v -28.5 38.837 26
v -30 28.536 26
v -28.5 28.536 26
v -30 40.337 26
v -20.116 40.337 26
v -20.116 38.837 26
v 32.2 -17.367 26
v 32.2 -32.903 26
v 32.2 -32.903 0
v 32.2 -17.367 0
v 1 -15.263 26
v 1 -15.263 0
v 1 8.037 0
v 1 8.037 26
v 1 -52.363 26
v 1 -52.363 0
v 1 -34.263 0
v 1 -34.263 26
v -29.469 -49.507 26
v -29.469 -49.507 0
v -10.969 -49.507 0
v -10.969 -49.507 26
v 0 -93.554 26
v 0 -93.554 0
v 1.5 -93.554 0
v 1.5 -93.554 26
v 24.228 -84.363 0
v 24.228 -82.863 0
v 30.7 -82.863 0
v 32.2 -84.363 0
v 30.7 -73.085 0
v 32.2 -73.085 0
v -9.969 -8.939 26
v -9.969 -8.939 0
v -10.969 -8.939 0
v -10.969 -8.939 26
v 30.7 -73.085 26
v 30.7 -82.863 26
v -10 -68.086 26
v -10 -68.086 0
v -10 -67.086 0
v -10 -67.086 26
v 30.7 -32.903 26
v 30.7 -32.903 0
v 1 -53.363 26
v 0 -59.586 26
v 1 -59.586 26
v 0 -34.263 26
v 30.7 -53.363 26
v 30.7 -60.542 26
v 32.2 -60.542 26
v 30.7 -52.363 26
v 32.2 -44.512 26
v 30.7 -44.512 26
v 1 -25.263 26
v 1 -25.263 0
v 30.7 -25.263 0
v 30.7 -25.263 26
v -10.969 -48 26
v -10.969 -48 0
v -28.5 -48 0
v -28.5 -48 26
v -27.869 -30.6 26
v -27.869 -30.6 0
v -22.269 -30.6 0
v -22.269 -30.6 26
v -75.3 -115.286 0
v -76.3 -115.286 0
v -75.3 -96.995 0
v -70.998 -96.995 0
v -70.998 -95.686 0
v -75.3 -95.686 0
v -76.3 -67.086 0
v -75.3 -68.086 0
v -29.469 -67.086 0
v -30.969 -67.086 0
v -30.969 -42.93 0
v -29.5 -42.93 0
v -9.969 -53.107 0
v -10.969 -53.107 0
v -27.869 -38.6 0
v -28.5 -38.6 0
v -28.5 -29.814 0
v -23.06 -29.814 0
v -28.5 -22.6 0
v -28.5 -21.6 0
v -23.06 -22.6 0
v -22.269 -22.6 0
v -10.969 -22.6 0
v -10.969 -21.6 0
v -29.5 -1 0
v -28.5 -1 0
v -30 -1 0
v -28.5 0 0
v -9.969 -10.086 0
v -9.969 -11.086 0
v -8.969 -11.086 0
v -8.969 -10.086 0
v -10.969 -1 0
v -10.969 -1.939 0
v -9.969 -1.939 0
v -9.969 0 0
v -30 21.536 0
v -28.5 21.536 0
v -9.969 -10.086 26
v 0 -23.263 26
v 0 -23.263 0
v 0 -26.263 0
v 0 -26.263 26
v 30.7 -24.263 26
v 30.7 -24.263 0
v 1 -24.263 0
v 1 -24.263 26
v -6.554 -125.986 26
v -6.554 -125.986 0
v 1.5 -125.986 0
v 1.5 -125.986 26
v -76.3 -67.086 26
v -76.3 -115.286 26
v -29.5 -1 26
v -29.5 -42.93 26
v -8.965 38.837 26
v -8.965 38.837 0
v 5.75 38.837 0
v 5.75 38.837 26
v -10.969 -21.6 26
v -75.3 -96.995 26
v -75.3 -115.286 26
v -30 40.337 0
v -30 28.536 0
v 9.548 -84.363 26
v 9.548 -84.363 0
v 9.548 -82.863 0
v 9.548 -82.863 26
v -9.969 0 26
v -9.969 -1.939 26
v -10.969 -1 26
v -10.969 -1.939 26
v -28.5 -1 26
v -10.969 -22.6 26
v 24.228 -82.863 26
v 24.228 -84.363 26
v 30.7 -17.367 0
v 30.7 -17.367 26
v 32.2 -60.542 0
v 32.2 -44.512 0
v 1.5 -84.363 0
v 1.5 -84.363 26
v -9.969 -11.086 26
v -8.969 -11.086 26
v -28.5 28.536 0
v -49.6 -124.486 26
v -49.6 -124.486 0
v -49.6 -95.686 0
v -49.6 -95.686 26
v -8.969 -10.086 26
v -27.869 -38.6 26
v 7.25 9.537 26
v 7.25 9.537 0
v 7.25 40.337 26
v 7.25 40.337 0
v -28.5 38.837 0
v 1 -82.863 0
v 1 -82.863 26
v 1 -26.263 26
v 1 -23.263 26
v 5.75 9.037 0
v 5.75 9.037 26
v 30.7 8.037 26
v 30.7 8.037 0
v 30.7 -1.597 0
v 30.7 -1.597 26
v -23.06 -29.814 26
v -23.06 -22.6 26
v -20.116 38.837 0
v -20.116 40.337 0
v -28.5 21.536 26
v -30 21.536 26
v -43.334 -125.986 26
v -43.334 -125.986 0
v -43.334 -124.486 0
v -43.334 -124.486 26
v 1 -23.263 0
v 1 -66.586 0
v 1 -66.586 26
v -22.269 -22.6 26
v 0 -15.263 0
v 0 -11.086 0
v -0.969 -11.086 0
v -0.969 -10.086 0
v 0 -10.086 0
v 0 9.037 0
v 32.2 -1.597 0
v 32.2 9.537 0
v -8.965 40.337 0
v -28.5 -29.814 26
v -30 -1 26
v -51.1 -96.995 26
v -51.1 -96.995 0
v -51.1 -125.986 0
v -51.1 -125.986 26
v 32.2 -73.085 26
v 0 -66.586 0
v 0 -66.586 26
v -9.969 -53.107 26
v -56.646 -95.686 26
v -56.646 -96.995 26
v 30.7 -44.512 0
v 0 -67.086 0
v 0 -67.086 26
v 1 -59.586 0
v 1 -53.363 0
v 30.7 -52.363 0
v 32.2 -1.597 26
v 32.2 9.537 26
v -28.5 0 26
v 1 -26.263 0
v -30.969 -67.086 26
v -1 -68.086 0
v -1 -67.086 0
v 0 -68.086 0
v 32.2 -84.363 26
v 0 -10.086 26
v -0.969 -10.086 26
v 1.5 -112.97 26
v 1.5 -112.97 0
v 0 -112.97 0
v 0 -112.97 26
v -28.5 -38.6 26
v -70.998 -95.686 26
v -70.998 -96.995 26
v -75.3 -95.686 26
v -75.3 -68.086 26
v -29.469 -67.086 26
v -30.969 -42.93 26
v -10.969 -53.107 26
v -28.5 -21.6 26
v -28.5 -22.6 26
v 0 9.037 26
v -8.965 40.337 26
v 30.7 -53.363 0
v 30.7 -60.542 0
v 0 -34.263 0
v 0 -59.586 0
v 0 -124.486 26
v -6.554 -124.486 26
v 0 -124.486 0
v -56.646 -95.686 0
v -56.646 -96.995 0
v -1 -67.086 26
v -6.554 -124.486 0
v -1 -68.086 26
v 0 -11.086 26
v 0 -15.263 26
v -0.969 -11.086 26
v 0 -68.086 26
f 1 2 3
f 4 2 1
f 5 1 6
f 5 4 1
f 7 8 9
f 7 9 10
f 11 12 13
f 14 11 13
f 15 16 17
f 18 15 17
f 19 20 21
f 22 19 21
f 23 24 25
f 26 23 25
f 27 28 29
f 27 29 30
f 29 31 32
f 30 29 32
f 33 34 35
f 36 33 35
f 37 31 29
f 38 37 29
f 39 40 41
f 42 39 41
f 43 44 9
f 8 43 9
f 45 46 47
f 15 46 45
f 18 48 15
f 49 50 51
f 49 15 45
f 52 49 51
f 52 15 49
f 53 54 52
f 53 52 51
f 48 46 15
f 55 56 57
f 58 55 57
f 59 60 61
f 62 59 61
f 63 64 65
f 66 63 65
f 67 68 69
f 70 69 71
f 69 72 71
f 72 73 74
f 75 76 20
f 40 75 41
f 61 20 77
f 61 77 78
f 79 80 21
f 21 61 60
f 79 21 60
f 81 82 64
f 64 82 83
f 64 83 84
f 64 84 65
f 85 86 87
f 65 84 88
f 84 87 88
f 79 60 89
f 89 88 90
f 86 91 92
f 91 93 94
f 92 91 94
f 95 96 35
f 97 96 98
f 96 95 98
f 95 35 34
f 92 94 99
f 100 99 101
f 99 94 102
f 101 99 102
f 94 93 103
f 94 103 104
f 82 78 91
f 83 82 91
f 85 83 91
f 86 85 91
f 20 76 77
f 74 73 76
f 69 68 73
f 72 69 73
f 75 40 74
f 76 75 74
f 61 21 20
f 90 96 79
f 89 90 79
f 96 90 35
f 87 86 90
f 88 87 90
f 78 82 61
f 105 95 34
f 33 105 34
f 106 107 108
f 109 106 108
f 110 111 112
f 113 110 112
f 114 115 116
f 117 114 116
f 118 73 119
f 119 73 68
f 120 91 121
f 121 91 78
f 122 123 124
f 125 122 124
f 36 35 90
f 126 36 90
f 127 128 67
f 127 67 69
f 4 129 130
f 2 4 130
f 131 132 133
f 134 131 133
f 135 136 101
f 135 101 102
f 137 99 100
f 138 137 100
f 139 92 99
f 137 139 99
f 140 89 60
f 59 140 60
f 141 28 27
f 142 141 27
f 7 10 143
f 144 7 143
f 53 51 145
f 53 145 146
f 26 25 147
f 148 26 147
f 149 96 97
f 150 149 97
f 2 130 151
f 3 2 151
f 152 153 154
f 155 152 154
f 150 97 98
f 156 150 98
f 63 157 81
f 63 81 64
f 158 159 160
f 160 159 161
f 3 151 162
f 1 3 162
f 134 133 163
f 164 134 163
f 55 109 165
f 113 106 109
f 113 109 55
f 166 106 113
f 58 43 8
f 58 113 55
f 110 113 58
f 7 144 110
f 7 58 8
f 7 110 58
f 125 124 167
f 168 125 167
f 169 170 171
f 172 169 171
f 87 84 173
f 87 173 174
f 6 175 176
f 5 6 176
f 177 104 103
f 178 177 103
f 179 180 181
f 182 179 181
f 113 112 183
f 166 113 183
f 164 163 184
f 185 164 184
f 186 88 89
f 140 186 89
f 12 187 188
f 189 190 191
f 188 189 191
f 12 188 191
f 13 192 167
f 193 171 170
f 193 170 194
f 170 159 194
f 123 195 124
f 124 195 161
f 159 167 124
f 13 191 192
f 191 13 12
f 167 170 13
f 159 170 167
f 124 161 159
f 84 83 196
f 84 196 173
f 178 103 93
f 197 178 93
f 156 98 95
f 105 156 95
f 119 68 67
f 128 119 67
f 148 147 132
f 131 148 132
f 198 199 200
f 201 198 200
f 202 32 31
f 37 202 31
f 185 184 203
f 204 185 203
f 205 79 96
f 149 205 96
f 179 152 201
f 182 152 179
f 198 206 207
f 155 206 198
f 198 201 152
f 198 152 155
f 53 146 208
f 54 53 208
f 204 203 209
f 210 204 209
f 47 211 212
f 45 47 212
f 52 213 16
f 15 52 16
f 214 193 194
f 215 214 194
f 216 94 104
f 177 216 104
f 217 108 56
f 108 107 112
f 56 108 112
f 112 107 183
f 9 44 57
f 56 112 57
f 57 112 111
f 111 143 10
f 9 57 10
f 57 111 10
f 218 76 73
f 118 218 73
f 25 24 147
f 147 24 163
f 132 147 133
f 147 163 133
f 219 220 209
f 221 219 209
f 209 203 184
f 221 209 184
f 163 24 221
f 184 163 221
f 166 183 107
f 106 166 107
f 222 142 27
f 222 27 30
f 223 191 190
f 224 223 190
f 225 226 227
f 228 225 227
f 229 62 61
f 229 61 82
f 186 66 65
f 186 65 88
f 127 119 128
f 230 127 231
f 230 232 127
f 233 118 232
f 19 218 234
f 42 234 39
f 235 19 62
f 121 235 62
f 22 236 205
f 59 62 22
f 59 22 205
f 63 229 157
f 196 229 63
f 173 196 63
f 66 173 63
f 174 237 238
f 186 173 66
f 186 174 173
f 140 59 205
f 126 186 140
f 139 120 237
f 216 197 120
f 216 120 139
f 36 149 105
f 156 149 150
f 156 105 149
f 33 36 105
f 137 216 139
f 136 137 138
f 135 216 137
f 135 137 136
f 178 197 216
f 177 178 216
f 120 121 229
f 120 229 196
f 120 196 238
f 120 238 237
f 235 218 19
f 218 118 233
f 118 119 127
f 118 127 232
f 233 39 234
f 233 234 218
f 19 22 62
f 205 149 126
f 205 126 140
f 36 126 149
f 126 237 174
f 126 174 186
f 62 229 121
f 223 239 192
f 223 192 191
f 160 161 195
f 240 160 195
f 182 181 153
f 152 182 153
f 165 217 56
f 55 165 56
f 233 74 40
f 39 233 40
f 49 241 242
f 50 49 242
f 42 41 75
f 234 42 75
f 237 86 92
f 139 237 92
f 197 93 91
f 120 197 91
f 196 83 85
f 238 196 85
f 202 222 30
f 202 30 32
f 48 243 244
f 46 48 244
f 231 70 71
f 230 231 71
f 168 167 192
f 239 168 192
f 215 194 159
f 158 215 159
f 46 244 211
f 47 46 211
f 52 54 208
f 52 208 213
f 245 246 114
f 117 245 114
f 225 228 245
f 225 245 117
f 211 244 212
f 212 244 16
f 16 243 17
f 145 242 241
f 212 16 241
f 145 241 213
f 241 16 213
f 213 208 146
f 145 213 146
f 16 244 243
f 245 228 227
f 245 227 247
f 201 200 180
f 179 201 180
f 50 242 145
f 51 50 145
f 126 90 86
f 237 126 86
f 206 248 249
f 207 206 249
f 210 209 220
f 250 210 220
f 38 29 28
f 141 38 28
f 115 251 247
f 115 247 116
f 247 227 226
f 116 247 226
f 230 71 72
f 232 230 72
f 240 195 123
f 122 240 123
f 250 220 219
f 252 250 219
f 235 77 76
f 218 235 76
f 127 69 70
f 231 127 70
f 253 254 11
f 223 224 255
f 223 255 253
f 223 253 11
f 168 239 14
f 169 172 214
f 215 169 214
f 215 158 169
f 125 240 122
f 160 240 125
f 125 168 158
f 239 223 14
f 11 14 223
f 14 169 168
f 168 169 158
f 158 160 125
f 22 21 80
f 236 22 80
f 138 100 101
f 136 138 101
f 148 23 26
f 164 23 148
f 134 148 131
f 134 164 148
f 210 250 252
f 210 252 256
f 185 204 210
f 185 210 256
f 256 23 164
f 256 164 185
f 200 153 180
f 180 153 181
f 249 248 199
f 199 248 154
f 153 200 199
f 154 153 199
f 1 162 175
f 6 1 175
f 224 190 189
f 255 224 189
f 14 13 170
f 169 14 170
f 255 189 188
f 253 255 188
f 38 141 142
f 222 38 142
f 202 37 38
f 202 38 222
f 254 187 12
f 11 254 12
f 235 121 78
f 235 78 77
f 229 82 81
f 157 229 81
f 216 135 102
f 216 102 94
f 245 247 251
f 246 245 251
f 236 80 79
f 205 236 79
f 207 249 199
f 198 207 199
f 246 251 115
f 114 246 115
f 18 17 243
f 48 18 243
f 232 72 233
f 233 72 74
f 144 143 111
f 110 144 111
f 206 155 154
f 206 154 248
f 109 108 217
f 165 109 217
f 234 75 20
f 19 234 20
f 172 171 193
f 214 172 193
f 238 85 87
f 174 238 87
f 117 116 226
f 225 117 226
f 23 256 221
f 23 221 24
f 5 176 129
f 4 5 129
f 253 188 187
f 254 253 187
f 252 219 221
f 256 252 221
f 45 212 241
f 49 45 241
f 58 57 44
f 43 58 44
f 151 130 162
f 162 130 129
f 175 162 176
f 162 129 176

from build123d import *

# Parameters (mm, degrees)
F1_DEPTH = 26
F0_W     = 5.439778775
F0_H     = 7.2139397055


with BuildPart() as f1:
    # F0 (on Top) → F1 (new body)
    with BuildSketch(Plane.XY):
        Polygon((-30, 28.5364296287), (-28.5, 28.5364296287), (-28.5, 38.837035358), (-20.1161447912, 38.837035358), (-20.1161447912, 40.337035358), (-30, 40.337035358), align=None)
    extrude(amount=F1_DEPTH)


with BuildPart() as f1b:
    # F0 (on Top) → F1, piece 2 (new body)
    with BuildSketch(Plane.XY):
        Polygon((-8.9654363692, 40.337035358), (-8.9654363692, 38.837035358), (0, 38.837035358), (5.75, 38.837035358), (5.75, 9.537035358), (7.25, 9.537035358), (7.25, 40.337035358), (0, 40.337035358), align=None)
        Polygon((32.2, 9.537035358), (7.25, 9.537035358), (7.25, 8.037035358), (30.7, 8.037035358), (30.7, -1.5970306704), (32.2, -1.5970306704), align=None)
        Polygon((0, -10.0858646248), (-0.9687261283, -10.0858646248), (-0.9687261283, -10.5858646248), (-0.9687261283, -11.0858646248), (0, -11.0858646248), (0, -15.262964642), (1, -15.262964642), (1, 8.037035358), (7.25, 8.037035358), (7.25, 9.537035358), (5.75, 9.537035358), (5.75, 9.037035358), (0, 9.037035358), (0, 0), align=None)
    extrude(amount=F1_DEPTH)


with BuildPart() as f1c:
    # F0 (on Top) → F1, piece 3 (new body)
    with BuildSketch(Plane.XY):
        Polygon((-9.9687261283, -1.939239528), (-9.9687261283, 0), (-28.5, 0), (-28.5, 21.5364296287), (-29.25, 21.5364296287), (-30, 21.5364296287), (-30, 21.337035358), (-30, 0), (-30, -1), (-29.5, -1), (-29.5, -20.0283872778), (-29.5, -42.9299995303), (-30.9687261283, -42.9299995303), (-30.9687261283, -67.0858646248), (-29.4687261283, -67.0858646248), (-29.4687261283, -53.1069921017), (-29.4687261283, -49.5069921017), (-10.9687261283, -49.5069921017), (-10.9687261283, -53.1069921017), (-9.9687261283, -53.1069921017), (-9.9687261283, -11.0858646248), (-8.9687261283, -11.0858646248), (-8.9687261283, -10.0858646248), (-9.9687261283, -10.0858646248), (-9.9687261283, -8.939239528), (-10.9687261283, -8.939239528), (-10.9687261283, -21.6), (-28.1687261283, -21.6), (-28.5, -21.6), (-28.5, -1), (-28.1687261283, -1), (-10.9687261283, -1), (-10.9687261283, -1.939239528), (-10.4687261283, -1.939239528), align=None)
        with Locations((-25.7801106125, -26.2069698527)):
            Rectangle(F0_W, F0_H, mode=Mode.SUBTRACT)
        Polygon((-22.2687261283, -30.6), (-22.2687261283, -22.6), (-10.9687261283, -22.6), (-10.9687261283, -30.6), (-10.9687261283, -38.6), (-10.9687261283, -48), (-28.1687261283, -48), (-28.5, -48), (-28.5, -38.6), (-27.8687261283, -38.6), (-27.8687261283, -30.6), align=None, mode=Mode.SUBTRACT)
        Polygon((-10.9687261283, -67.0858646248), (-29.4687261283, -67.0858646248), (-30.9687261283, -67.0858646248), (-76.3, -67.0858646248), (-76.3, -115.2858646248), (-75.3, -115.2858646248), (-75.3, -96.9952866435), (-70.9983035922, -96.9952866435), (-70.9983035922, -95.6858646248), (-75.3, -95.6858646248), (-75.3, -68.0858646248), (-51.1, -68.0858646248), (-49.6, -68.0858646248), (-10.9687261283, -68.0858646248), (-10, -68.0858646248), (-10, -67.0858646248), align=None)
    extrude(amount=F1_DEPTH)


with BuildPart() as f1d:
    # F0 (on Top) → F1, piece 4 (new body)
    with BuildSketch(Plane.XY):
        Polygon((30.7, -52.362964642), (1, -52.362964642), (1, -53.362964642), (30.7, -53.362964642), (30.7, -60.5419501662), (32.2, -60.5419501662), (32.2, -44.5117205381), (30.7, -44.5117205381), align=None)
        Polygon((1, -34.262964642), (0, -34.262964642), (0, -59.5858646248), (1, -59.5858646248), (1, -53.362964642), (1, -52.362964642), align=None)
    extrude(amount=F1_DEPTH)


with BuildPart() as f1e:
    # F0 (on Top) → F1, piece 5 (new body)
    with BuildSketch(Plane.XY):
        Polygon((30.7, -82.862964642), (24.2280215025, -82.862964642), (24.2280215025, -84.362964642), (32.2, -84.362964642), (32.2, -73.0849951506), (30.7, -73.0849951506), align=None)
    extrude(amount=F1_DEPTH)


with BuildPart() as f1f:
    # F0 (on Top) → F1, piece 6 (new body)
    with BuildSketch(Plane.XY):
        Polygon((1, -66.5858646248), (0, -66.5858646248), (0, -67.0858646248), (-1, -67.0858646248), (-1, -67.5858646248), (-1, -68.0858646248), (0, -68.0858646248), (0, -93.5541018844), (1.5, -93.5541018844), (1.5, -84.362964642), (9.5475884154, -84.362964642), (9.5475884154, -82.862964642), (1, -82.862964642), align=None)
    extrude(amount=F1_DEPTH)


with BuildPart() as f1g:
    # F0 (on Top) → F1, piece 7 (new body)
    with BuildSketch(Plane.XY):
        Polygon((1.5, -112.9701584578), (0, -112.9701584578), (0, -124.4858646248), (-6.5535241738, -124.4858646248), (-6.5535241738, -125.9858646248), (1.5, -125.9858646248), align=None)
    extrude(amount=F1_DEPTH)


with BuildPart() as f1h:
    # F0 (on Top) → F1, piece 8 (new body)
    with BuildSketch(Plane.XY):
        Polygon((-51.1, -96.9952866435), (-51.1, -115.2858646248), (-51.1, -125.9858646248), (-43.3335267007, -125.9858646248), (-43.3335267007, -124.4858646248), (-49.6, -124.4858646248), (-49.6, -95.6858646248), (-51.1, -95.6858646248), (-56.6463023424, -95.6858646248), (-56.6463023424, -96.9952866435), align=None)
    extrude(amount=F1_DEPTH)


with BuildPart() as f1i:
    # F0 (on Top) → F1, piece 9 (new body)
    with BuildSketch(Plane.XY):
        Polygon((0.5, -23.262964642), (0, -23.262964642), (0, -26.262964642), (0.5, -26.262964642), (1, -26.262964642), (1, -25.262964642), (5.75, -25.262964642), (30.7, -25.262964642), (30.7, -32.9032726586), (32.2, -32.9032726586), (32.2, -25.262964642), (32.2, -17.3665154725), (30.7, -17.3665154725), (30.7, -24.262964642), (1, -24.262964642), (1, -23.262964642), align=None)
    extrude(amount=F1_DEPTH)


solid = Compound([f1.part, f1b.part, f1c.part, f1d.part, f1e.part, f1f.part, f1g.part, f1h.part, f1i.part])
